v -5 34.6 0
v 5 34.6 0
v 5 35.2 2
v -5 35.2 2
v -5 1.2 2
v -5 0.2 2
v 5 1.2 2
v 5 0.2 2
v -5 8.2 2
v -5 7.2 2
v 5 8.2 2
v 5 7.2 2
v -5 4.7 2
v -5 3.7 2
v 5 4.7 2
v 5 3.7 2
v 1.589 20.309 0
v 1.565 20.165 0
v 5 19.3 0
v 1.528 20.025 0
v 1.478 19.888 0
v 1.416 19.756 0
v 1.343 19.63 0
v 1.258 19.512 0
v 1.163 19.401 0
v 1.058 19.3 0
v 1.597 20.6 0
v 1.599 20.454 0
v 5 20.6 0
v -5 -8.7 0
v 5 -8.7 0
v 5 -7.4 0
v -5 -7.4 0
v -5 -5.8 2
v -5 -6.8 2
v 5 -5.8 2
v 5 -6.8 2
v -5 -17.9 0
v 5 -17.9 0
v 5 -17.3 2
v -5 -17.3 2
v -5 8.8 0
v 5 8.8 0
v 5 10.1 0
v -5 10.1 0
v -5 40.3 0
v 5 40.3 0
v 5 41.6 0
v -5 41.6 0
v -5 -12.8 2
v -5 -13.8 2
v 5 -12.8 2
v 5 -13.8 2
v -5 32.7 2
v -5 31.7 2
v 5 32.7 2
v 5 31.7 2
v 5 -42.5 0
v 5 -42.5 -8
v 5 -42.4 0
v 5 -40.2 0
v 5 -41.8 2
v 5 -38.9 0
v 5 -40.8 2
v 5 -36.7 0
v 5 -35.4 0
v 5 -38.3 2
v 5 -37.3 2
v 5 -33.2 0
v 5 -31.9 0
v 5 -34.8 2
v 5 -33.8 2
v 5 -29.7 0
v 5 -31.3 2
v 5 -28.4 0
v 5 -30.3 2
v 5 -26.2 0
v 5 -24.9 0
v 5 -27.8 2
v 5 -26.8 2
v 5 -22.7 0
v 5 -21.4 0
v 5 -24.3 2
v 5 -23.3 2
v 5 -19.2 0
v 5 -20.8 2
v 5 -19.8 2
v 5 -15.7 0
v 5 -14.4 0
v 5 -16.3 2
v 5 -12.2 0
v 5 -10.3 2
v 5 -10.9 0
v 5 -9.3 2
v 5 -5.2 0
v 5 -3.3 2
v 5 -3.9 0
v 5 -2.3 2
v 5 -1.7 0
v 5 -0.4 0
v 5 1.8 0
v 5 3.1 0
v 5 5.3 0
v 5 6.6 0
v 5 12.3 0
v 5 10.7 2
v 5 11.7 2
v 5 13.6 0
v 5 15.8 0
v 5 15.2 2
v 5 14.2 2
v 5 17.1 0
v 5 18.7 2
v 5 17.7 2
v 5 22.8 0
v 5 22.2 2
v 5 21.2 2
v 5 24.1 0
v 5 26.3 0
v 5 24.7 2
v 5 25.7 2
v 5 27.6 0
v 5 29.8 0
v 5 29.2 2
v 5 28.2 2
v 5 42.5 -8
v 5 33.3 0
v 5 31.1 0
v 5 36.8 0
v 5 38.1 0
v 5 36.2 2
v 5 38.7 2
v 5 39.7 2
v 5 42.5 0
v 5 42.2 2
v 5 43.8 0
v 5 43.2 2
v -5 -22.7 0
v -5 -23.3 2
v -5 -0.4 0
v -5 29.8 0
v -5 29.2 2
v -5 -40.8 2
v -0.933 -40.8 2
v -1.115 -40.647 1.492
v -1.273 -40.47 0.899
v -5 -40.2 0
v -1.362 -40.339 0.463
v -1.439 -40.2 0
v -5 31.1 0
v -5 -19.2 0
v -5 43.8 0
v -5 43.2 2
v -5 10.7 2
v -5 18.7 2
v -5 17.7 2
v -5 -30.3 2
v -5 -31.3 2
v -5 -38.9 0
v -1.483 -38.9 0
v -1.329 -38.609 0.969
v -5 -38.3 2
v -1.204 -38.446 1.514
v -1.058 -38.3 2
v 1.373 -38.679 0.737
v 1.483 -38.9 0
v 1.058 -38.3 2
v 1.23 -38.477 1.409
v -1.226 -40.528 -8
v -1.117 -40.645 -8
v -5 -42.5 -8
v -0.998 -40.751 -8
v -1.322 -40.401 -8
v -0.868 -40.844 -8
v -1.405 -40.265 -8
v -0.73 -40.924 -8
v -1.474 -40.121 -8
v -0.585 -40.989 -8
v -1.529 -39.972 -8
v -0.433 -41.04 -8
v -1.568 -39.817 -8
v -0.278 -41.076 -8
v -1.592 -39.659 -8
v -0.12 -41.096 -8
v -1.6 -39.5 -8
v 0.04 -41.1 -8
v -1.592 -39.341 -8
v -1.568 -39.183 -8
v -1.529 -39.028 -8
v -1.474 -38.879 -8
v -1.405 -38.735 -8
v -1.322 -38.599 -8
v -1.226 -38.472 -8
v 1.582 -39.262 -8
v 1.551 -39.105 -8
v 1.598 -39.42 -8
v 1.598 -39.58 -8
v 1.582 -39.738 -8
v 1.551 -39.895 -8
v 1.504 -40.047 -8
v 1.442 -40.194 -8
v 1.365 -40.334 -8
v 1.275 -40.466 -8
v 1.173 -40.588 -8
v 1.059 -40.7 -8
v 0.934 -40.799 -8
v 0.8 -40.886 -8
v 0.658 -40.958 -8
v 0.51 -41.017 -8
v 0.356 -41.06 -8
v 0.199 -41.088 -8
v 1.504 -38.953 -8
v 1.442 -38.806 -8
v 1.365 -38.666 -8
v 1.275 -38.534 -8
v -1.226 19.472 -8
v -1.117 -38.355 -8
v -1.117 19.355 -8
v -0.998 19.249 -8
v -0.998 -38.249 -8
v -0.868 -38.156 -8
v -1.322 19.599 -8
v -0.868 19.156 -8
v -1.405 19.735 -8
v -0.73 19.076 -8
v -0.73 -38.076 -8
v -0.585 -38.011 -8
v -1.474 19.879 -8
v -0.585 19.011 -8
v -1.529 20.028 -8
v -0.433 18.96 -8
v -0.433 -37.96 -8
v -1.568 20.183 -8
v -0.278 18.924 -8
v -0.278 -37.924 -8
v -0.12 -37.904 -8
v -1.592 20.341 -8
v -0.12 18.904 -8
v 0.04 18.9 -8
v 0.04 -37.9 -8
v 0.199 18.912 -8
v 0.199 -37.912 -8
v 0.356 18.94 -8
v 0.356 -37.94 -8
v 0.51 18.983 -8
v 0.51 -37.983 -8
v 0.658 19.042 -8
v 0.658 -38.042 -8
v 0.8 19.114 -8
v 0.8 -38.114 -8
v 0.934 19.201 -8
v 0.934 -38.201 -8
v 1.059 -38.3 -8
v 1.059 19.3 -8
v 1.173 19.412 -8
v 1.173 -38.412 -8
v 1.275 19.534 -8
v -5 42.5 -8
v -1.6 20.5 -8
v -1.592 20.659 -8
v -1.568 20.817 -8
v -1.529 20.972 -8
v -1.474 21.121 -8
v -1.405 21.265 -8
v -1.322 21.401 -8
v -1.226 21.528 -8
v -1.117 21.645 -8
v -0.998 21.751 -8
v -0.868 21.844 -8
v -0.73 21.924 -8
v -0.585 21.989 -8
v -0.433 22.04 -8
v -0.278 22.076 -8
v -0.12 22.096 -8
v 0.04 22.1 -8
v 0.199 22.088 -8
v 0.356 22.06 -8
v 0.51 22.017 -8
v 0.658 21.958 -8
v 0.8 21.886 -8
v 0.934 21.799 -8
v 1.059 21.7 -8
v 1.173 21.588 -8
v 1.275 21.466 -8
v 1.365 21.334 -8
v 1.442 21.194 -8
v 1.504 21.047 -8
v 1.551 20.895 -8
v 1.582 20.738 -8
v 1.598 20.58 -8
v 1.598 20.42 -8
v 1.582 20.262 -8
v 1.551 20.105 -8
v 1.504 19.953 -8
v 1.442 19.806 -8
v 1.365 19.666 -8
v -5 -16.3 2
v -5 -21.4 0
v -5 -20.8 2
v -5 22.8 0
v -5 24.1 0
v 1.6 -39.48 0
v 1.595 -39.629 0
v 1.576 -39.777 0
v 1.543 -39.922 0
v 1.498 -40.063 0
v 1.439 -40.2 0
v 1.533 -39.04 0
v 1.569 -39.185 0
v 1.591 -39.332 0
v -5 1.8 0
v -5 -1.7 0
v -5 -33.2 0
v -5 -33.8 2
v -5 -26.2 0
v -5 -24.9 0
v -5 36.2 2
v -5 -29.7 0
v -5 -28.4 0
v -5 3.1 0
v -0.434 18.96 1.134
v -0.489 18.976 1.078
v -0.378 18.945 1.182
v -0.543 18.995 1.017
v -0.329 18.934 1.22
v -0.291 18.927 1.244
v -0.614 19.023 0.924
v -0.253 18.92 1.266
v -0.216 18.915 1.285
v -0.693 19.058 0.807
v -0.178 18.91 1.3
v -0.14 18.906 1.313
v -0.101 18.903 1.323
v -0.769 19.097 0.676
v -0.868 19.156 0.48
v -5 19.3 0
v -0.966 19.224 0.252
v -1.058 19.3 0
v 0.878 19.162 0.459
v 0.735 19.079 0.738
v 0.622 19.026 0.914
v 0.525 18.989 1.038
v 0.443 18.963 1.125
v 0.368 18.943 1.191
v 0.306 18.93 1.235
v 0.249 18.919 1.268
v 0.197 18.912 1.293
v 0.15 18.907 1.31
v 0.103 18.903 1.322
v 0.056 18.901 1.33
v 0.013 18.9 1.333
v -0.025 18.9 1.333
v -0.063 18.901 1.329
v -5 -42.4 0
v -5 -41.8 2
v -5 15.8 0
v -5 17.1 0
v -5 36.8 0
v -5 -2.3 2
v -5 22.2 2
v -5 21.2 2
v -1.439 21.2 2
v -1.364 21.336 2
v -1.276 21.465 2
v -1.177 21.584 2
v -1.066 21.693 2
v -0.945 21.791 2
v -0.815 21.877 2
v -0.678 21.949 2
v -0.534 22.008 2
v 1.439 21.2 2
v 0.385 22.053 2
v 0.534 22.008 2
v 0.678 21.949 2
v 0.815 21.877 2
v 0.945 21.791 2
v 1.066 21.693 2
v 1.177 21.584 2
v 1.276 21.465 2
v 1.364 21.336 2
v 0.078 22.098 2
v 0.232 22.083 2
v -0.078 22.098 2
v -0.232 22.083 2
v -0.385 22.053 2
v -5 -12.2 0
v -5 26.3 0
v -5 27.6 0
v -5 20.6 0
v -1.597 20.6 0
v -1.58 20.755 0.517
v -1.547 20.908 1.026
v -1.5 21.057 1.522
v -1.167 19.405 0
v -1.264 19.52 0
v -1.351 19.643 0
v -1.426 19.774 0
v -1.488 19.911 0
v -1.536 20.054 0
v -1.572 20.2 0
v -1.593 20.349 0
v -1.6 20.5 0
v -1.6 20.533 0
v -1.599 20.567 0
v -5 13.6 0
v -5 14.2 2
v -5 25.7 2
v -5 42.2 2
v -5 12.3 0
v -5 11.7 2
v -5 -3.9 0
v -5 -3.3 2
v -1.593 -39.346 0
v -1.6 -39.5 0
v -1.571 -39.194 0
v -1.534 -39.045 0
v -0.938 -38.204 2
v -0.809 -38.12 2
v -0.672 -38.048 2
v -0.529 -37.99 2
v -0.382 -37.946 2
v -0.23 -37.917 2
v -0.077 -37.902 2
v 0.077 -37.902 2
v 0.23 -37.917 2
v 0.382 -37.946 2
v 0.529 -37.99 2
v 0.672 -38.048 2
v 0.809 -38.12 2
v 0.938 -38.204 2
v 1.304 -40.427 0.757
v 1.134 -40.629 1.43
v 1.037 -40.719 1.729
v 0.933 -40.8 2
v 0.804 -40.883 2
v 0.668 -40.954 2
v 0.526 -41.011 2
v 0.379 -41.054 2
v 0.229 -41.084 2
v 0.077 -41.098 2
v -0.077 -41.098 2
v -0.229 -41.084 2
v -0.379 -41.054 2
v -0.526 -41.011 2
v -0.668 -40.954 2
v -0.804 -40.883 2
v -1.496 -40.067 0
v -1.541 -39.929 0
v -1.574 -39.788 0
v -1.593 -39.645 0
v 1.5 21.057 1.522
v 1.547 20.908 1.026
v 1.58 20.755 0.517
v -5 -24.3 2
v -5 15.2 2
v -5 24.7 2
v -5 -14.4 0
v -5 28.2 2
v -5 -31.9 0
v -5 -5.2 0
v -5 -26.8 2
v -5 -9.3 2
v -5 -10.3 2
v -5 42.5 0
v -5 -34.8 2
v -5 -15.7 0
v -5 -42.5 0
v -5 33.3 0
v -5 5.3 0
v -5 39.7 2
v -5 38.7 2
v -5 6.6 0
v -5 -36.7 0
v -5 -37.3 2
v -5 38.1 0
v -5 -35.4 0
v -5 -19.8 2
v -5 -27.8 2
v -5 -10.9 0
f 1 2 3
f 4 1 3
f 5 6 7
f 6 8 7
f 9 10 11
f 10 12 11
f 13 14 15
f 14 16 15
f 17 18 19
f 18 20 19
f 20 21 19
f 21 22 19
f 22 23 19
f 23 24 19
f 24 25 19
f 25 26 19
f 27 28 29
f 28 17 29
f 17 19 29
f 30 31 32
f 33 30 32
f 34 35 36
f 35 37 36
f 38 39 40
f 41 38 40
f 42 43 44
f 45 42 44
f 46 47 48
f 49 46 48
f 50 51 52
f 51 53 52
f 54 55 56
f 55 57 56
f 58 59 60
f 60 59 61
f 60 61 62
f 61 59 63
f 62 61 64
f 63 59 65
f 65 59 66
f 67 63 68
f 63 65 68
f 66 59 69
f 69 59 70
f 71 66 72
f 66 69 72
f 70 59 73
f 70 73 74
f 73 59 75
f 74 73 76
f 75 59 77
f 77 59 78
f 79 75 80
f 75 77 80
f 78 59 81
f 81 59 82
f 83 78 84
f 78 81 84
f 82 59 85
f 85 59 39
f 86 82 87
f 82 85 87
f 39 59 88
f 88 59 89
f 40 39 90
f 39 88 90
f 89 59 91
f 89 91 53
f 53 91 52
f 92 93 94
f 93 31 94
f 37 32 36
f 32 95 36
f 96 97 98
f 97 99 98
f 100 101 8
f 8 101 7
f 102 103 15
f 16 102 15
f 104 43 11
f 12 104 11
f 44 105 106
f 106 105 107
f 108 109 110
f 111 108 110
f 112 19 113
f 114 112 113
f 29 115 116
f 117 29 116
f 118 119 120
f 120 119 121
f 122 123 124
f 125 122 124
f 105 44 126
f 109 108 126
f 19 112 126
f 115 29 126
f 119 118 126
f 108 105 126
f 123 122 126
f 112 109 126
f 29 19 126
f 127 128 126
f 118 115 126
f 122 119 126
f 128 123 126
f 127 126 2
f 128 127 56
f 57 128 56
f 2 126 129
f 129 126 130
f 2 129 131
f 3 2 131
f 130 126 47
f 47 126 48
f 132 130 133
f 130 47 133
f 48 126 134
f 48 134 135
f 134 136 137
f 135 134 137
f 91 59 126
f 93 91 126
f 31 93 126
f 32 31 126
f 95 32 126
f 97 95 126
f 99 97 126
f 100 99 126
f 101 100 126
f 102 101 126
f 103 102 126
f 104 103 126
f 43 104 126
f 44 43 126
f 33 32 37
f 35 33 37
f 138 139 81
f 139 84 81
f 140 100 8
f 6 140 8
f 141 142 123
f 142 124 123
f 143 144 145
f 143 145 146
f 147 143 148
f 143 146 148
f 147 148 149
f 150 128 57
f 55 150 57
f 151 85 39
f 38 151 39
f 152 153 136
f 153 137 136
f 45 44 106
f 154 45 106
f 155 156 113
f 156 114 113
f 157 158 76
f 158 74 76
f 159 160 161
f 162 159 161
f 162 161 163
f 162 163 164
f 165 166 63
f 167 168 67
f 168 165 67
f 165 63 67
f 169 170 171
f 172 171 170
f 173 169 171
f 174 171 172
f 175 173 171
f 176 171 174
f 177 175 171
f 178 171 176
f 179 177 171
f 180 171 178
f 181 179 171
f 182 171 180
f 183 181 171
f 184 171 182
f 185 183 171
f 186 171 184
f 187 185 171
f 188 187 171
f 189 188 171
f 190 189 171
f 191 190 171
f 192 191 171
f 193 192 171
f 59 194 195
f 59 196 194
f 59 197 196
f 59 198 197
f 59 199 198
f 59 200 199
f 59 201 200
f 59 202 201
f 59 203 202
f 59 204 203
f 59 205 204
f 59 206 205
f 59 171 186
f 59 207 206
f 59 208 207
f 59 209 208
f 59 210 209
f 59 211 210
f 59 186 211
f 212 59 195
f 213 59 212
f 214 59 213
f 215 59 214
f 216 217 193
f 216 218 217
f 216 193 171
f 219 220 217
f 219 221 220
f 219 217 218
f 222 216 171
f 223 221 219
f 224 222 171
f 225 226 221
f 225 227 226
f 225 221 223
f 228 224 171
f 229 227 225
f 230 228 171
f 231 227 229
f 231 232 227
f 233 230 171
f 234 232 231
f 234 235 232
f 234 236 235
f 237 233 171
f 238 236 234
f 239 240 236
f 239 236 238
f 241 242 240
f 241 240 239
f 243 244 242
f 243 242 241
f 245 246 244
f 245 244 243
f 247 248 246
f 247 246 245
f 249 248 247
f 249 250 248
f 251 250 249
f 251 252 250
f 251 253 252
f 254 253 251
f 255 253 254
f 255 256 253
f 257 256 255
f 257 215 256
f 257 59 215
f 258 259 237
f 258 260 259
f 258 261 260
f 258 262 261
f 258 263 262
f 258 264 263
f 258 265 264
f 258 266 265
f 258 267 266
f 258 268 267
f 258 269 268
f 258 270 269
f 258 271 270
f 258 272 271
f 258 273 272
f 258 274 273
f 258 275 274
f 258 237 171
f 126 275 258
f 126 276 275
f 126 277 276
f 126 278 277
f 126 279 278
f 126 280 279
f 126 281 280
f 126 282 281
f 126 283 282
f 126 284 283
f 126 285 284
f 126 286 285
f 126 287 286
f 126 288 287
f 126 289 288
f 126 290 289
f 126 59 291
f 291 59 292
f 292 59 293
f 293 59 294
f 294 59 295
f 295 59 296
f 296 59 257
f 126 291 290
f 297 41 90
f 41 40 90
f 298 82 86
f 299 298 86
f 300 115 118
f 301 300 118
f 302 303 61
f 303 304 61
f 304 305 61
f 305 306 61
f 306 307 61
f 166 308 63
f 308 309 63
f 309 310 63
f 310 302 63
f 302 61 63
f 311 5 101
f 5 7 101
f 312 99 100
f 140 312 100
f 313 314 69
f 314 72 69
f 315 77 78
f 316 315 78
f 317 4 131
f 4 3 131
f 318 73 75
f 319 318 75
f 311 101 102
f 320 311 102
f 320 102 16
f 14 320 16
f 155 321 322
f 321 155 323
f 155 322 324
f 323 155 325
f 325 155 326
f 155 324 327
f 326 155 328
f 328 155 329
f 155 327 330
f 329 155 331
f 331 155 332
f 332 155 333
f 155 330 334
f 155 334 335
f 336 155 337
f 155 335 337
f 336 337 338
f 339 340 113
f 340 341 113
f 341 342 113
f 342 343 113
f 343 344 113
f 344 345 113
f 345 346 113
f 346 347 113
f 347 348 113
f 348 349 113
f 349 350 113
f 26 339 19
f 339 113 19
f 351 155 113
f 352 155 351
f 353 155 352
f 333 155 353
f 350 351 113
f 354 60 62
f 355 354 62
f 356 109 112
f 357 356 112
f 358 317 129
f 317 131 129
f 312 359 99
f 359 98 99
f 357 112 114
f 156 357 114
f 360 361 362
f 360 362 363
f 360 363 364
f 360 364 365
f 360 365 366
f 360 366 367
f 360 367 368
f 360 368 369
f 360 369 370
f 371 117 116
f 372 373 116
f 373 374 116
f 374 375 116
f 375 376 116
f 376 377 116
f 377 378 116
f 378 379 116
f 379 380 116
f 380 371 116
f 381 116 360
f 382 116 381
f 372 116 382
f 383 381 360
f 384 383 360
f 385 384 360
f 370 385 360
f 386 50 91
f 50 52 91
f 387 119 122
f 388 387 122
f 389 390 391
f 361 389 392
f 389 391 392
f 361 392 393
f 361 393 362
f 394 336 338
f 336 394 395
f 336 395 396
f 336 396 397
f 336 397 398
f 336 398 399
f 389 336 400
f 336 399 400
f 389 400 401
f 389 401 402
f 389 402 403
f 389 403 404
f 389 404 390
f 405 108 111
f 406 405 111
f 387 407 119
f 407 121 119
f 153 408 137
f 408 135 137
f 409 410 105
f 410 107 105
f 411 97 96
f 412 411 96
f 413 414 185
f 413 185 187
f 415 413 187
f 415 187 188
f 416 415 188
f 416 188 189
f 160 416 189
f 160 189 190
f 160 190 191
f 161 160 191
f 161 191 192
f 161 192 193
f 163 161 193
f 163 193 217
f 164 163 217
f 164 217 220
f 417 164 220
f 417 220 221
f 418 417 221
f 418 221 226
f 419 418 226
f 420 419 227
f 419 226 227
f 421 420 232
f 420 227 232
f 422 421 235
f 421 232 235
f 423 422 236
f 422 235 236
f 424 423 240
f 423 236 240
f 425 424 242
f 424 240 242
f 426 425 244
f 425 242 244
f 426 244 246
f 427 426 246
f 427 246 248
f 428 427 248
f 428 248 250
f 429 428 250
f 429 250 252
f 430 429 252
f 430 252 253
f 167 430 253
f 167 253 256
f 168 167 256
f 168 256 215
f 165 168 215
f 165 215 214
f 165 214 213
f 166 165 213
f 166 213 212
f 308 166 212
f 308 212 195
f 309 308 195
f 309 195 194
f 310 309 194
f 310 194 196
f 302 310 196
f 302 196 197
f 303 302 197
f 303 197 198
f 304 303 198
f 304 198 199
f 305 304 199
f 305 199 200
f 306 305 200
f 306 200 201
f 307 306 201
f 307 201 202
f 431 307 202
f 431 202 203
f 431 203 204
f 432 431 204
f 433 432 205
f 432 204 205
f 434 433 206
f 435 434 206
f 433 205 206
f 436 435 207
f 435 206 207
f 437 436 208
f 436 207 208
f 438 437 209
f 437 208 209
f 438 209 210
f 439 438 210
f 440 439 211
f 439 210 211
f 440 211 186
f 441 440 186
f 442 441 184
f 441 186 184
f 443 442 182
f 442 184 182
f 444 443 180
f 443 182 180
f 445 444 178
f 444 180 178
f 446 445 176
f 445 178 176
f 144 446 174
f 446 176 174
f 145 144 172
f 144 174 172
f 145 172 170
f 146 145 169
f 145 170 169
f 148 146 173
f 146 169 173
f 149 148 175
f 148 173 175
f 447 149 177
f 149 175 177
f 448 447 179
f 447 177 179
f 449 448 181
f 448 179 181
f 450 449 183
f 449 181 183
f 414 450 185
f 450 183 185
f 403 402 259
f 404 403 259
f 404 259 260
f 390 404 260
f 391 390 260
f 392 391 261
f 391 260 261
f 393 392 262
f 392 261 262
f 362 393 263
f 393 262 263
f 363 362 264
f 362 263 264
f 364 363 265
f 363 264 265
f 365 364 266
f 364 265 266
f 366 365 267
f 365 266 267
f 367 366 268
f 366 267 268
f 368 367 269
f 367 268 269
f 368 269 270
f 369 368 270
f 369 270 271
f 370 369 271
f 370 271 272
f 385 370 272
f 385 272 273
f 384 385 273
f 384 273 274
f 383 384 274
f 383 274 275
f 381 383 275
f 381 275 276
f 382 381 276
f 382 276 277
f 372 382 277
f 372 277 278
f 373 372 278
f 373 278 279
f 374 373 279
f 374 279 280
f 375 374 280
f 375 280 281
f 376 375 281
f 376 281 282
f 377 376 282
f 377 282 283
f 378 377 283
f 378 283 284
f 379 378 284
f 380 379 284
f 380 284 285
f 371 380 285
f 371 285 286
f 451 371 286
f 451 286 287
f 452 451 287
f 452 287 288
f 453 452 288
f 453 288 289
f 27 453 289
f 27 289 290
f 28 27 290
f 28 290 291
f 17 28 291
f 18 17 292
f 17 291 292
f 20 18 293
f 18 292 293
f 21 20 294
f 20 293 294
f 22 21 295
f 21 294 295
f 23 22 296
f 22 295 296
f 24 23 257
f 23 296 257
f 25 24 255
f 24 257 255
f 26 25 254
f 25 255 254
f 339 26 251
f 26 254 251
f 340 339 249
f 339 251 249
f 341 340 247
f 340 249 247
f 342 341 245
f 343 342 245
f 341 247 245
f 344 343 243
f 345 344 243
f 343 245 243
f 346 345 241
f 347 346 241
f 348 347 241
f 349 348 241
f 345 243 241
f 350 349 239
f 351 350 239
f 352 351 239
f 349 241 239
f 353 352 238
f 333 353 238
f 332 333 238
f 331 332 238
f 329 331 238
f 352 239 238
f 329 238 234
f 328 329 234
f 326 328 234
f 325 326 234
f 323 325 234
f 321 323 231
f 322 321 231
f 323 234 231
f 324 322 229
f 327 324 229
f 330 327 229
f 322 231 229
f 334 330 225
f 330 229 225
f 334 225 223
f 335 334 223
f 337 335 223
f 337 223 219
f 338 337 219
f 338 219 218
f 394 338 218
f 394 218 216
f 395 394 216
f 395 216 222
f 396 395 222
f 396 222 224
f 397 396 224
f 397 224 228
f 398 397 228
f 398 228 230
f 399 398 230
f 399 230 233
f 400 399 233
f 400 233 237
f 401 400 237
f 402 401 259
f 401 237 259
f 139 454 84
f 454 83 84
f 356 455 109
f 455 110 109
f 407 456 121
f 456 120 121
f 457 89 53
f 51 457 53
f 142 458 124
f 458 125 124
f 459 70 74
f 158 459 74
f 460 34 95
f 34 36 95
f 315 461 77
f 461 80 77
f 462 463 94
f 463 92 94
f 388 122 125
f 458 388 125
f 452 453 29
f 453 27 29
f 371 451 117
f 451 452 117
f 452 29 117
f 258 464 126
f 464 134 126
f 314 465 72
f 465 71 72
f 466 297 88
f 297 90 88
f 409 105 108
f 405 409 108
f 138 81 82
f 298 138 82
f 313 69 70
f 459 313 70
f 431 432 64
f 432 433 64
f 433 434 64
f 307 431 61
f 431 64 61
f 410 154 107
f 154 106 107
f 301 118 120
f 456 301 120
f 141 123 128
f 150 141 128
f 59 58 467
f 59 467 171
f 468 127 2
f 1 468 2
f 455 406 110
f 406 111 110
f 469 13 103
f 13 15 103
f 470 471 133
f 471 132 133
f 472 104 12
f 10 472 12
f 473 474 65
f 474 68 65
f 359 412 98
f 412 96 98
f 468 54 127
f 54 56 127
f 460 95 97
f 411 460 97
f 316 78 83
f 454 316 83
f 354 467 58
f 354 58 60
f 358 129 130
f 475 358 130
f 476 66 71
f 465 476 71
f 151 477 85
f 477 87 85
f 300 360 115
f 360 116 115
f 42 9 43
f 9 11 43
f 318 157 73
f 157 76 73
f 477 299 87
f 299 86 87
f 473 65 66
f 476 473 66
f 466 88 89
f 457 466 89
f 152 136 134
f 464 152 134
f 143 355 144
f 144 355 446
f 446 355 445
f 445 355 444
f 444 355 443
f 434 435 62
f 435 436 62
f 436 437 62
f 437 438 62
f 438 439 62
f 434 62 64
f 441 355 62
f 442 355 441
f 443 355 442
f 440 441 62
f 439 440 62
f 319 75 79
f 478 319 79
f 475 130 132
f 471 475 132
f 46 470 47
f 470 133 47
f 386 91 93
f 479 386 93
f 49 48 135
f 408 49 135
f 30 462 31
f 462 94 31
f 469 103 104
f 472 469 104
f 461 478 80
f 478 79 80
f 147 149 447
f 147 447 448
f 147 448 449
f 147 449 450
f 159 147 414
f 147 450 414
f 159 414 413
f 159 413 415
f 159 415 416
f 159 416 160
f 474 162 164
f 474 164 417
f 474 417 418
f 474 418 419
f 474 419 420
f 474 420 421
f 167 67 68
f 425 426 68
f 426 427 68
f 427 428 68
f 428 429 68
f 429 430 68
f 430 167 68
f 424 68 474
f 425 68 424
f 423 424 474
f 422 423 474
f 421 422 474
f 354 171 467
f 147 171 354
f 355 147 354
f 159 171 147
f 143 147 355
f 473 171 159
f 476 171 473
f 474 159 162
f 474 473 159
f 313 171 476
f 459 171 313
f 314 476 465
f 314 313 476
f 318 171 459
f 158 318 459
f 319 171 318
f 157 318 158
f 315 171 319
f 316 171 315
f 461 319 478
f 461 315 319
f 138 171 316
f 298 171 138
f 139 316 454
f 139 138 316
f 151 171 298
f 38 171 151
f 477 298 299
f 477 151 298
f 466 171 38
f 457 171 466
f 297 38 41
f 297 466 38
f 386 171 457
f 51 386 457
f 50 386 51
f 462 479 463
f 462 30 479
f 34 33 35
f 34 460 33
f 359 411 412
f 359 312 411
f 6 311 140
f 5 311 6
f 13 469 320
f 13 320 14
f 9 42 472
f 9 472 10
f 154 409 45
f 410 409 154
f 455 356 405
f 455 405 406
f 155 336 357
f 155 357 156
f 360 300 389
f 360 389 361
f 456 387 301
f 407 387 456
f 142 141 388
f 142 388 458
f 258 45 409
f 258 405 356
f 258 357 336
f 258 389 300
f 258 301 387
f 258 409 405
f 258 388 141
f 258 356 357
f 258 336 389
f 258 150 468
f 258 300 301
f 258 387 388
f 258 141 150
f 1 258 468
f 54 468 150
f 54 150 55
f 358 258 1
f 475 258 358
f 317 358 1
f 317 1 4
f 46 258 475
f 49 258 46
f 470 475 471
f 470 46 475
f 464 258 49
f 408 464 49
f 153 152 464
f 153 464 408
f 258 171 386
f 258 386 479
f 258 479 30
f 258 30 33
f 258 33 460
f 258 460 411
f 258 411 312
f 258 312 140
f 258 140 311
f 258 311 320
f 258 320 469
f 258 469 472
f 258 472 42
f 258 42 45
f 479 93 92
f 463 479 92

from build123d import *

# Parameters (mm, degrees)
SKETCH_1_W             = 8
SKETCH_1_H             = 85
EXTRUDE_1_DEPTH        = 5
EXTRUDE_2_DEPTH        = 5
PATTERN_LINEAR_1_COUNT = 51
PATTERN_LINEAR_1_PITCH = 3.5
SKETCH_3_R             = 1.6
CUT_EXTRUDE_1_DEPTH    = 46.204424562


with BuildPart() as part:
    # 草图1 → 凸台-拉伸1 (new, symmetric)
    with BuildSketch(Plane(origin=(0, 0, 0), x_dir=(0, 0, -1), z_dir=(1, 0, 0))):
        with Locations((4, 0)):
            Rectangle(SKETCH_1_W, SKETCH_1_H)
    extrude(amount=EXTRUDE_1_DEPTH, both=True)

    # 草图2 → 凸台-拉伸2 (add, symmetric)
    with BuildSketch(Plane(origin=(0, 0, 0), x_dir=(0, 0, -1), z_dir=(1, 0, 0))):
        Polygon((0, -42.4), (-2, -41.8), (-2, -40.8), (0, -40.2), align=None)
    extrude_2 = extrude(amount=EXTRUDE_2_DEPTH, both=True)

    # 阵列(线性)1: 凸台-拉伸2 ×51, 26 skipped
    with Locations(*[(0, i * PATTERN_LINEAR_1_PITCH, 0) for i in range(1, PATTERN_LINEAR_1_COUNT) if i not in (25, 26, 27, 28, 29, 30, 31, 32, 33, 34, 35, 36, 37, 38, 39, 40, 41, 42, 43, 44, 45, 46, 47, 48, 49, 50)]):
        add(extrude_2)

    # 草图3 → 切除-拉伸1 (cut, through all)
    with BuildSketch(Plane(origin=(0, 0, -8), x_dir=(-1, 0, 0), z_dir=(0, 0, -1))):
        with Locations((0, -39.5)):
            Circle(SKETCH_3_R)
        with Locations((0, 20.5)):
            Circle(SKETCH_3_R)
        with Locations((0, 80.5)):
            Circle(SKETCH_3_R)
    extrude(amount=-CUT_EXTRUDE_1_DEPTH, mode=Mode.SUBTRACT)


solid = part.part
